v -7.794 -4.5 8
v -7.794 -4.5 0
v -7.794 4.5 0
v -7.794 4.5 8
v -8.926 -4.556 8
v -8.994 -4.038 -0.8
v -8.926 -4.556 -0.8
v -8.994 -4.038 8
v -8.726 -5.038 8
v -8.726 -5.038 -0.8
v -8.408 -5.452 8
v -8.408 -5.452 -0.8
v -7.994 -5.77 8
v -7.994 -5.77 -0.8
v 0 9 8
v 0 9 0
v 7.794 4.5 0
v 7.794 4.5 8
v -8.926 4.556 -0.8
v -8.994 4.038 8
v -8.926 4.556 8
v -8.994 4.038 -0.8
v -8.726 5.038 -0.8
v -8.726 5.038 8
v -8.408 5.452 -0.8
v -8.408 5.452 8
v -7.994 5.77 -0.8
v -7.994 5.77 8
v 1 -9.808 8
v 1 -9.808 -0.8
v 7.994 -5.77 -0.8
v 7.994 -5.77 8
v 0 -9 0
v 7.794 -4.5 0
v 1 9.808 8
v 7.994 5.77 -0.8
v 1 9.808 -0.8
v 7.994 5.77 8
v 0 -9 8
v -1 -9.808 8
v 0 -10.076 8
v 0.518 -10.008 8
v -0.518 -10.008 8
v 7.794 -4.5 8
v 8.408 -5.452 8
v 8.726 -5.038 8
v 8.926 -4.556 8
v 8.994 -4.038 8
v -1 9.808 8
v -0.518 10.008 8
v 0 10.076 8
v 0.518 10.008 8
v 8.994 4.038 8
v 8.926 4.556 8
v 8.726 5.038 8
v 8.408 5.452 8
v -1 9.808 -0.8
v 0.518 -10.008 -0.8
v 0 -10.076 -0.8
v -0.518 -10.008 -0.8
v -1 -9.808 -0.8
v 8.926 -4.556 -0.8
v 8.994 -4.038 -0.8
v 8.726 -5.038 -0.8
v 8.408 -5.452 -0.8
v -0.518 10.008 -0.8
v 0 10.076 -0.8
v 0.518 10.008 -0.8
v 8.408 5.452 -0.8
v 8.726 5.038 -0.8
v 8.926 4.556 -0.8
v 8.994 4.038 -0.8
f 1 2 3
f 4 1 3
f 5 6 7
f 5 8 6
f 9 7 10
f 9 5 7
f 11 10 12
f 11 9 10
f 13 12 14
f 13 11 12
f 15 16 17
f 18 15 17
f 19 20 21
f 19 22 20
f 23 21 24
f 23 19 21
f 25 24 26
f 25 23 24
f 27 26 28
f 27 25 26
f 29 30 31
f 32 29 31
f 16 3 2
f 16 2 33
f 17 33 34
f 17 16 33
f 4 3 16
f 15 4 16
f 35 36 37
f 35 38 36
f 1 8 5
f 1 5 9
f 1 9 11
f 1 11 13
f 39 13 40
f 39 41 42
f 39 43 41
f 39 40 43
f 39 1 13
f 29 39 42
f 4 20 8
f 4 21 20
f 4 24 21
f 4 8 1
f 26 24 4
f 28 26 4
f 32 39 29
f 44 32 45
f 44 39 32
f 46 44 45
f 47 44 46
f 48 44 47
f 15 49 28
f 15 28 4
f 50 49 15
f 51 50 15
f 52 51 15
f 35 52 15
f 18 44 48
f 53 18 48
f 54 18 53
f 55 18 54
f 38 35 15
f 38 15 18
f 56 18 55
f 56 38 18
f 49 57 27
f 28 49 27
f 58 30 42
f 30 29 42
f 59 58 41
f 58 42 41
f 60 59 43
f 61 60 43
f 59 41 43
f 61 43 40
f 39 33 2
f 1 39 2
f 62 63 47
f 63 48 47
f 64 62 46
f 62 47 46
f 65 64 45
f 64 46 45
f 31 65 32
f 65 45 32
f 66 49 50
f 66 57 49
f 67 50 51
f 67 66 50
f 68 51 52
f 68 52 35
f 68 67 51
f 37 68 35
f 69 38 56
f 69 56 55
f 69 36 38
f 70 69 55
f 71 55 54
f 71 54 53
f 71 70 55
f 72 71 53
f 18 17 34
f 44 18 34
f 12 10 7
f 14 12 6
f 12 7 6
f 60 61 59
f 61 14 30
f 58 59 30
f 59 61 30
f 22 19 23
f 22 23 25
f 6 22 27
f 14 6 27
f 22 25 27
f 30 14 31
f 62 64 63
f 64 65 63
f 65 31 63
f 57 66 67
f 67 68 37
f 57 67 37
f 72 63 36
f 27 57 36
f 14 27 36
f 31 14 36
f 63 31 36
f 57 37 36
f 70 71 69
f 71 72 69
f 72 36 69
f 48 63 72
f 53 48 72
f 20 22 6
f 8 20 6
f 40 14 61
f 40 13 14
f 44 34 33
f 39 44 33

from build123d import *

# Parameters (mm, degrees)
F1_DEPTH = 8
F2_DEPTH = 0.8
F3_R     = 2


with BuildPart() as f1:
    # F0 (on Top) → F1 (new body)
    with BuildSketch(Plane.XY):
        Polygon((-8.9942286341, 5.192820323), (-8.9942286341, -5.192820323), (0, -10.3856406461), (8.9942286341, -5.192820323), (8.9942286341, 5.192820323), (0, 10.3856406461), align=None)
        Polygon((0, -9), (-7.7942286341, -4.5), (-7.7942286341, 4.5), (0, 9), (7.7942286341, 4.5), (7.7942286341, -4.5), align=None, mode=Mode.SUBTRACT)
    extrude(amount=F1_DEPTH)

    # F0 (on Top) → F2 (join)
    with BuildSketch(Plane.XY):
        Polygon((-8.9942286341, 5.192820323), (-8.9942286341, -5.192820323), (0, -10.3856406461), (8.9942286341, -5.192820323), (8.9942286341, 5.192820323), (0, 10.3856406461), align=None)
        Polygon((0, -9), (-7.7942286341, -4.5), (-7.7942286341, 4.5), (0, 9), (7.7942286341, 4.5), (7.7942286341, -4.5), align=None, mode=Mode.SUBTRACT)
        Polygon((-7.7942286341, 4.5), (-7.7942286341, -4.5), (0, -9), (7.7942286341, -4.5), (7.7942286341, 4.5), (0, 9), align=None)
    extrude(amount=-F2_DEPTH)

    # F3
    f3_edges = [f1.edges().sort_by_distance(p)[0] for p in [
        (-8.994229, -5.19282, 3.6),
        (-8.994229, 5.19282, 3.6),
        (0, -10.385641, 3.6),
        (8.994229, -5.19282, 3.6),
        (8.994229, 5.19282, 3.6),
        (0, 10.385641, 3.6),
    ]]
    fillet(f3_edges, radius=F3_R)


solid = f1.part
